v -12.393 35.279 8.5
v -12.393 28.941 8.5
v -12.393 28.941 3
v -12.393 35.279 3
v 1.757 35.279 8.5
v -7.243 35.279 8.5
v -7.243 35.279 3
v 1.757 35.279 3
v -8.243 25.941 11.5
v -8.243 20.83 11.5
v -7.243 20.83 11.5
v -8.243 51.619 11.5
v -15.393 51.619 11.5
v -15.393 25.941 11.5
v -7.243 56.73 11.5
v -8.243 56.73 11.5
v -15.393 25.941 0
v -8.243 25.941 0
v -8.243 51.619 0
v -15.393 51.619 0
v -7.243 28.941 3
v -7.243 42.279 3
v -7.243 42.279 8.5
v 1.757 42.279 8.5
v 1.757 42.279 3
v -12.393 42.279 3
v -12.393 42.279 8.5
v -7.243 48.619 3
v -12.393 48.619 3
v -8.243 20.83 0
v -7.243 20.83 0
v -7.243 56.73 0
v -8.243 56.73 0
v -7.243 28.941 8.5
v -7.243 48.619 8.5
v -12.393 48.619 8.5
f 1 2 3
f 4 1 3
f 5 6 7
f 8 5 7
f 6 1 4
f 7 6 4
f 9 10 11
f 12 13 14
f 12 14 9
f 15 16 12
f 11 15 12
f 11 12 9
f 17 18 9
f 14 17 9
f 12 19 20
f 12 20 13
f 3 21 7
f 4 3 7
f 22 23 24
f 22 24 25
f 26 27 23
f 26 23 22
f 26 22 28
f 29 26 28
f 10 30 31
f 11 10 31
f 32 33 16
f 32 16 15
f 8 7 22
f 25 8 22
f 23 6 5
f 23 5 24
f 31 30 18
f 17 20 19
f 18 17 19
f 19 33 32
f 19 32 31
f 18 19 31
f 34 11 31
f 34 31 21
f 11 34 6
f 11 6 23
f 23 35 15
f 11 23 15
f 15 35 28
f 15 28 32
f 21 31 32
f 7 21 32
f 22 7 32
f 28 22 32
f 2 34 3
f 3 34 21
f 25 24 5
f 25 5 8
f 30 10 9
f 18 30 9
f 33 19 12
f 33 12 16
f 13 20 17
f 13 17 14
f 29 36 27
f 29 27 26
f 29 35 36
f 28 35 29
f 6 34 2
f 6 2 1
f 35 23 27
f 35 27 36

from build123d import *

# Parameters (mm, degrees)
SKETCH2_W           = 1
SKETCH2_H           = 35.9
BASE_EXTRUDE_DEPTH  = 11.5
SKETCH3_W           = 11.5
SKETCH3_H           = 25.678293072
BOSS_EXTRUDE1_DEPTH = 7.15
SKETCH4_W           = 5.5
SKETCH4_H           = 19.678293072
CUT_EXTRUDE1_DEPTH  = 5.15
SKETCH5_W           = 5.5
SKETCH5_H           = 7
BOSS_EXTRUDE3_DEPTH = 14.15


with BuildPart() as part:
    # Sketch2 → Base-Extrude (new body)
    with BuildSketch(Plane.XY):
        with Locations((-7.742570808, 38.78)):
            Rectangle(SKETCH2_W, SKETCH2_H)
    extrude(amount=BASE_EXTRUDE_DEPTH)

    # Sketch3 → Boss-Extrude1 (add)
    with BuildSketch(Plane.ZY.offset(8.242570808)):
        with Locations((5.75, 38.78)):
            Rectangle(SKETCH3_W, SKETCH3_H)
    extrude(amount=BOSS_EXTRUDE1_DEPTH)

    # Sketch4 → Cut-Extrude1 (cut)
    with BuildSketch(Plane(origin=(-7.242570808, 0, 0), x_dir=(0, 0, -1), z_dir=(1, 0, 0))):
        with Locations((-5.75, 38.78)):
            Rectangle(SKETCH4_W, SKETCH4_H)
    extrude(amount=-CUT_EXTRUDE1_DEPTH, mode=Mode.SUBTRACT)

    # Sketch5 → Boss-Extrude3 (add)
    with BuildSketch(Plane(origin=(-12.392570808, 0, 0), x_dir=(0, 0, -1), z_dir=(1, 0, 0))):
        with Locations((-5.75, 38.779386514)):
            Rectangle(SKETCH5_W, SKETCH5_H)
    extrude(amount=BOSS_EXTRUDE3_DEPTH)


solid = part.part
